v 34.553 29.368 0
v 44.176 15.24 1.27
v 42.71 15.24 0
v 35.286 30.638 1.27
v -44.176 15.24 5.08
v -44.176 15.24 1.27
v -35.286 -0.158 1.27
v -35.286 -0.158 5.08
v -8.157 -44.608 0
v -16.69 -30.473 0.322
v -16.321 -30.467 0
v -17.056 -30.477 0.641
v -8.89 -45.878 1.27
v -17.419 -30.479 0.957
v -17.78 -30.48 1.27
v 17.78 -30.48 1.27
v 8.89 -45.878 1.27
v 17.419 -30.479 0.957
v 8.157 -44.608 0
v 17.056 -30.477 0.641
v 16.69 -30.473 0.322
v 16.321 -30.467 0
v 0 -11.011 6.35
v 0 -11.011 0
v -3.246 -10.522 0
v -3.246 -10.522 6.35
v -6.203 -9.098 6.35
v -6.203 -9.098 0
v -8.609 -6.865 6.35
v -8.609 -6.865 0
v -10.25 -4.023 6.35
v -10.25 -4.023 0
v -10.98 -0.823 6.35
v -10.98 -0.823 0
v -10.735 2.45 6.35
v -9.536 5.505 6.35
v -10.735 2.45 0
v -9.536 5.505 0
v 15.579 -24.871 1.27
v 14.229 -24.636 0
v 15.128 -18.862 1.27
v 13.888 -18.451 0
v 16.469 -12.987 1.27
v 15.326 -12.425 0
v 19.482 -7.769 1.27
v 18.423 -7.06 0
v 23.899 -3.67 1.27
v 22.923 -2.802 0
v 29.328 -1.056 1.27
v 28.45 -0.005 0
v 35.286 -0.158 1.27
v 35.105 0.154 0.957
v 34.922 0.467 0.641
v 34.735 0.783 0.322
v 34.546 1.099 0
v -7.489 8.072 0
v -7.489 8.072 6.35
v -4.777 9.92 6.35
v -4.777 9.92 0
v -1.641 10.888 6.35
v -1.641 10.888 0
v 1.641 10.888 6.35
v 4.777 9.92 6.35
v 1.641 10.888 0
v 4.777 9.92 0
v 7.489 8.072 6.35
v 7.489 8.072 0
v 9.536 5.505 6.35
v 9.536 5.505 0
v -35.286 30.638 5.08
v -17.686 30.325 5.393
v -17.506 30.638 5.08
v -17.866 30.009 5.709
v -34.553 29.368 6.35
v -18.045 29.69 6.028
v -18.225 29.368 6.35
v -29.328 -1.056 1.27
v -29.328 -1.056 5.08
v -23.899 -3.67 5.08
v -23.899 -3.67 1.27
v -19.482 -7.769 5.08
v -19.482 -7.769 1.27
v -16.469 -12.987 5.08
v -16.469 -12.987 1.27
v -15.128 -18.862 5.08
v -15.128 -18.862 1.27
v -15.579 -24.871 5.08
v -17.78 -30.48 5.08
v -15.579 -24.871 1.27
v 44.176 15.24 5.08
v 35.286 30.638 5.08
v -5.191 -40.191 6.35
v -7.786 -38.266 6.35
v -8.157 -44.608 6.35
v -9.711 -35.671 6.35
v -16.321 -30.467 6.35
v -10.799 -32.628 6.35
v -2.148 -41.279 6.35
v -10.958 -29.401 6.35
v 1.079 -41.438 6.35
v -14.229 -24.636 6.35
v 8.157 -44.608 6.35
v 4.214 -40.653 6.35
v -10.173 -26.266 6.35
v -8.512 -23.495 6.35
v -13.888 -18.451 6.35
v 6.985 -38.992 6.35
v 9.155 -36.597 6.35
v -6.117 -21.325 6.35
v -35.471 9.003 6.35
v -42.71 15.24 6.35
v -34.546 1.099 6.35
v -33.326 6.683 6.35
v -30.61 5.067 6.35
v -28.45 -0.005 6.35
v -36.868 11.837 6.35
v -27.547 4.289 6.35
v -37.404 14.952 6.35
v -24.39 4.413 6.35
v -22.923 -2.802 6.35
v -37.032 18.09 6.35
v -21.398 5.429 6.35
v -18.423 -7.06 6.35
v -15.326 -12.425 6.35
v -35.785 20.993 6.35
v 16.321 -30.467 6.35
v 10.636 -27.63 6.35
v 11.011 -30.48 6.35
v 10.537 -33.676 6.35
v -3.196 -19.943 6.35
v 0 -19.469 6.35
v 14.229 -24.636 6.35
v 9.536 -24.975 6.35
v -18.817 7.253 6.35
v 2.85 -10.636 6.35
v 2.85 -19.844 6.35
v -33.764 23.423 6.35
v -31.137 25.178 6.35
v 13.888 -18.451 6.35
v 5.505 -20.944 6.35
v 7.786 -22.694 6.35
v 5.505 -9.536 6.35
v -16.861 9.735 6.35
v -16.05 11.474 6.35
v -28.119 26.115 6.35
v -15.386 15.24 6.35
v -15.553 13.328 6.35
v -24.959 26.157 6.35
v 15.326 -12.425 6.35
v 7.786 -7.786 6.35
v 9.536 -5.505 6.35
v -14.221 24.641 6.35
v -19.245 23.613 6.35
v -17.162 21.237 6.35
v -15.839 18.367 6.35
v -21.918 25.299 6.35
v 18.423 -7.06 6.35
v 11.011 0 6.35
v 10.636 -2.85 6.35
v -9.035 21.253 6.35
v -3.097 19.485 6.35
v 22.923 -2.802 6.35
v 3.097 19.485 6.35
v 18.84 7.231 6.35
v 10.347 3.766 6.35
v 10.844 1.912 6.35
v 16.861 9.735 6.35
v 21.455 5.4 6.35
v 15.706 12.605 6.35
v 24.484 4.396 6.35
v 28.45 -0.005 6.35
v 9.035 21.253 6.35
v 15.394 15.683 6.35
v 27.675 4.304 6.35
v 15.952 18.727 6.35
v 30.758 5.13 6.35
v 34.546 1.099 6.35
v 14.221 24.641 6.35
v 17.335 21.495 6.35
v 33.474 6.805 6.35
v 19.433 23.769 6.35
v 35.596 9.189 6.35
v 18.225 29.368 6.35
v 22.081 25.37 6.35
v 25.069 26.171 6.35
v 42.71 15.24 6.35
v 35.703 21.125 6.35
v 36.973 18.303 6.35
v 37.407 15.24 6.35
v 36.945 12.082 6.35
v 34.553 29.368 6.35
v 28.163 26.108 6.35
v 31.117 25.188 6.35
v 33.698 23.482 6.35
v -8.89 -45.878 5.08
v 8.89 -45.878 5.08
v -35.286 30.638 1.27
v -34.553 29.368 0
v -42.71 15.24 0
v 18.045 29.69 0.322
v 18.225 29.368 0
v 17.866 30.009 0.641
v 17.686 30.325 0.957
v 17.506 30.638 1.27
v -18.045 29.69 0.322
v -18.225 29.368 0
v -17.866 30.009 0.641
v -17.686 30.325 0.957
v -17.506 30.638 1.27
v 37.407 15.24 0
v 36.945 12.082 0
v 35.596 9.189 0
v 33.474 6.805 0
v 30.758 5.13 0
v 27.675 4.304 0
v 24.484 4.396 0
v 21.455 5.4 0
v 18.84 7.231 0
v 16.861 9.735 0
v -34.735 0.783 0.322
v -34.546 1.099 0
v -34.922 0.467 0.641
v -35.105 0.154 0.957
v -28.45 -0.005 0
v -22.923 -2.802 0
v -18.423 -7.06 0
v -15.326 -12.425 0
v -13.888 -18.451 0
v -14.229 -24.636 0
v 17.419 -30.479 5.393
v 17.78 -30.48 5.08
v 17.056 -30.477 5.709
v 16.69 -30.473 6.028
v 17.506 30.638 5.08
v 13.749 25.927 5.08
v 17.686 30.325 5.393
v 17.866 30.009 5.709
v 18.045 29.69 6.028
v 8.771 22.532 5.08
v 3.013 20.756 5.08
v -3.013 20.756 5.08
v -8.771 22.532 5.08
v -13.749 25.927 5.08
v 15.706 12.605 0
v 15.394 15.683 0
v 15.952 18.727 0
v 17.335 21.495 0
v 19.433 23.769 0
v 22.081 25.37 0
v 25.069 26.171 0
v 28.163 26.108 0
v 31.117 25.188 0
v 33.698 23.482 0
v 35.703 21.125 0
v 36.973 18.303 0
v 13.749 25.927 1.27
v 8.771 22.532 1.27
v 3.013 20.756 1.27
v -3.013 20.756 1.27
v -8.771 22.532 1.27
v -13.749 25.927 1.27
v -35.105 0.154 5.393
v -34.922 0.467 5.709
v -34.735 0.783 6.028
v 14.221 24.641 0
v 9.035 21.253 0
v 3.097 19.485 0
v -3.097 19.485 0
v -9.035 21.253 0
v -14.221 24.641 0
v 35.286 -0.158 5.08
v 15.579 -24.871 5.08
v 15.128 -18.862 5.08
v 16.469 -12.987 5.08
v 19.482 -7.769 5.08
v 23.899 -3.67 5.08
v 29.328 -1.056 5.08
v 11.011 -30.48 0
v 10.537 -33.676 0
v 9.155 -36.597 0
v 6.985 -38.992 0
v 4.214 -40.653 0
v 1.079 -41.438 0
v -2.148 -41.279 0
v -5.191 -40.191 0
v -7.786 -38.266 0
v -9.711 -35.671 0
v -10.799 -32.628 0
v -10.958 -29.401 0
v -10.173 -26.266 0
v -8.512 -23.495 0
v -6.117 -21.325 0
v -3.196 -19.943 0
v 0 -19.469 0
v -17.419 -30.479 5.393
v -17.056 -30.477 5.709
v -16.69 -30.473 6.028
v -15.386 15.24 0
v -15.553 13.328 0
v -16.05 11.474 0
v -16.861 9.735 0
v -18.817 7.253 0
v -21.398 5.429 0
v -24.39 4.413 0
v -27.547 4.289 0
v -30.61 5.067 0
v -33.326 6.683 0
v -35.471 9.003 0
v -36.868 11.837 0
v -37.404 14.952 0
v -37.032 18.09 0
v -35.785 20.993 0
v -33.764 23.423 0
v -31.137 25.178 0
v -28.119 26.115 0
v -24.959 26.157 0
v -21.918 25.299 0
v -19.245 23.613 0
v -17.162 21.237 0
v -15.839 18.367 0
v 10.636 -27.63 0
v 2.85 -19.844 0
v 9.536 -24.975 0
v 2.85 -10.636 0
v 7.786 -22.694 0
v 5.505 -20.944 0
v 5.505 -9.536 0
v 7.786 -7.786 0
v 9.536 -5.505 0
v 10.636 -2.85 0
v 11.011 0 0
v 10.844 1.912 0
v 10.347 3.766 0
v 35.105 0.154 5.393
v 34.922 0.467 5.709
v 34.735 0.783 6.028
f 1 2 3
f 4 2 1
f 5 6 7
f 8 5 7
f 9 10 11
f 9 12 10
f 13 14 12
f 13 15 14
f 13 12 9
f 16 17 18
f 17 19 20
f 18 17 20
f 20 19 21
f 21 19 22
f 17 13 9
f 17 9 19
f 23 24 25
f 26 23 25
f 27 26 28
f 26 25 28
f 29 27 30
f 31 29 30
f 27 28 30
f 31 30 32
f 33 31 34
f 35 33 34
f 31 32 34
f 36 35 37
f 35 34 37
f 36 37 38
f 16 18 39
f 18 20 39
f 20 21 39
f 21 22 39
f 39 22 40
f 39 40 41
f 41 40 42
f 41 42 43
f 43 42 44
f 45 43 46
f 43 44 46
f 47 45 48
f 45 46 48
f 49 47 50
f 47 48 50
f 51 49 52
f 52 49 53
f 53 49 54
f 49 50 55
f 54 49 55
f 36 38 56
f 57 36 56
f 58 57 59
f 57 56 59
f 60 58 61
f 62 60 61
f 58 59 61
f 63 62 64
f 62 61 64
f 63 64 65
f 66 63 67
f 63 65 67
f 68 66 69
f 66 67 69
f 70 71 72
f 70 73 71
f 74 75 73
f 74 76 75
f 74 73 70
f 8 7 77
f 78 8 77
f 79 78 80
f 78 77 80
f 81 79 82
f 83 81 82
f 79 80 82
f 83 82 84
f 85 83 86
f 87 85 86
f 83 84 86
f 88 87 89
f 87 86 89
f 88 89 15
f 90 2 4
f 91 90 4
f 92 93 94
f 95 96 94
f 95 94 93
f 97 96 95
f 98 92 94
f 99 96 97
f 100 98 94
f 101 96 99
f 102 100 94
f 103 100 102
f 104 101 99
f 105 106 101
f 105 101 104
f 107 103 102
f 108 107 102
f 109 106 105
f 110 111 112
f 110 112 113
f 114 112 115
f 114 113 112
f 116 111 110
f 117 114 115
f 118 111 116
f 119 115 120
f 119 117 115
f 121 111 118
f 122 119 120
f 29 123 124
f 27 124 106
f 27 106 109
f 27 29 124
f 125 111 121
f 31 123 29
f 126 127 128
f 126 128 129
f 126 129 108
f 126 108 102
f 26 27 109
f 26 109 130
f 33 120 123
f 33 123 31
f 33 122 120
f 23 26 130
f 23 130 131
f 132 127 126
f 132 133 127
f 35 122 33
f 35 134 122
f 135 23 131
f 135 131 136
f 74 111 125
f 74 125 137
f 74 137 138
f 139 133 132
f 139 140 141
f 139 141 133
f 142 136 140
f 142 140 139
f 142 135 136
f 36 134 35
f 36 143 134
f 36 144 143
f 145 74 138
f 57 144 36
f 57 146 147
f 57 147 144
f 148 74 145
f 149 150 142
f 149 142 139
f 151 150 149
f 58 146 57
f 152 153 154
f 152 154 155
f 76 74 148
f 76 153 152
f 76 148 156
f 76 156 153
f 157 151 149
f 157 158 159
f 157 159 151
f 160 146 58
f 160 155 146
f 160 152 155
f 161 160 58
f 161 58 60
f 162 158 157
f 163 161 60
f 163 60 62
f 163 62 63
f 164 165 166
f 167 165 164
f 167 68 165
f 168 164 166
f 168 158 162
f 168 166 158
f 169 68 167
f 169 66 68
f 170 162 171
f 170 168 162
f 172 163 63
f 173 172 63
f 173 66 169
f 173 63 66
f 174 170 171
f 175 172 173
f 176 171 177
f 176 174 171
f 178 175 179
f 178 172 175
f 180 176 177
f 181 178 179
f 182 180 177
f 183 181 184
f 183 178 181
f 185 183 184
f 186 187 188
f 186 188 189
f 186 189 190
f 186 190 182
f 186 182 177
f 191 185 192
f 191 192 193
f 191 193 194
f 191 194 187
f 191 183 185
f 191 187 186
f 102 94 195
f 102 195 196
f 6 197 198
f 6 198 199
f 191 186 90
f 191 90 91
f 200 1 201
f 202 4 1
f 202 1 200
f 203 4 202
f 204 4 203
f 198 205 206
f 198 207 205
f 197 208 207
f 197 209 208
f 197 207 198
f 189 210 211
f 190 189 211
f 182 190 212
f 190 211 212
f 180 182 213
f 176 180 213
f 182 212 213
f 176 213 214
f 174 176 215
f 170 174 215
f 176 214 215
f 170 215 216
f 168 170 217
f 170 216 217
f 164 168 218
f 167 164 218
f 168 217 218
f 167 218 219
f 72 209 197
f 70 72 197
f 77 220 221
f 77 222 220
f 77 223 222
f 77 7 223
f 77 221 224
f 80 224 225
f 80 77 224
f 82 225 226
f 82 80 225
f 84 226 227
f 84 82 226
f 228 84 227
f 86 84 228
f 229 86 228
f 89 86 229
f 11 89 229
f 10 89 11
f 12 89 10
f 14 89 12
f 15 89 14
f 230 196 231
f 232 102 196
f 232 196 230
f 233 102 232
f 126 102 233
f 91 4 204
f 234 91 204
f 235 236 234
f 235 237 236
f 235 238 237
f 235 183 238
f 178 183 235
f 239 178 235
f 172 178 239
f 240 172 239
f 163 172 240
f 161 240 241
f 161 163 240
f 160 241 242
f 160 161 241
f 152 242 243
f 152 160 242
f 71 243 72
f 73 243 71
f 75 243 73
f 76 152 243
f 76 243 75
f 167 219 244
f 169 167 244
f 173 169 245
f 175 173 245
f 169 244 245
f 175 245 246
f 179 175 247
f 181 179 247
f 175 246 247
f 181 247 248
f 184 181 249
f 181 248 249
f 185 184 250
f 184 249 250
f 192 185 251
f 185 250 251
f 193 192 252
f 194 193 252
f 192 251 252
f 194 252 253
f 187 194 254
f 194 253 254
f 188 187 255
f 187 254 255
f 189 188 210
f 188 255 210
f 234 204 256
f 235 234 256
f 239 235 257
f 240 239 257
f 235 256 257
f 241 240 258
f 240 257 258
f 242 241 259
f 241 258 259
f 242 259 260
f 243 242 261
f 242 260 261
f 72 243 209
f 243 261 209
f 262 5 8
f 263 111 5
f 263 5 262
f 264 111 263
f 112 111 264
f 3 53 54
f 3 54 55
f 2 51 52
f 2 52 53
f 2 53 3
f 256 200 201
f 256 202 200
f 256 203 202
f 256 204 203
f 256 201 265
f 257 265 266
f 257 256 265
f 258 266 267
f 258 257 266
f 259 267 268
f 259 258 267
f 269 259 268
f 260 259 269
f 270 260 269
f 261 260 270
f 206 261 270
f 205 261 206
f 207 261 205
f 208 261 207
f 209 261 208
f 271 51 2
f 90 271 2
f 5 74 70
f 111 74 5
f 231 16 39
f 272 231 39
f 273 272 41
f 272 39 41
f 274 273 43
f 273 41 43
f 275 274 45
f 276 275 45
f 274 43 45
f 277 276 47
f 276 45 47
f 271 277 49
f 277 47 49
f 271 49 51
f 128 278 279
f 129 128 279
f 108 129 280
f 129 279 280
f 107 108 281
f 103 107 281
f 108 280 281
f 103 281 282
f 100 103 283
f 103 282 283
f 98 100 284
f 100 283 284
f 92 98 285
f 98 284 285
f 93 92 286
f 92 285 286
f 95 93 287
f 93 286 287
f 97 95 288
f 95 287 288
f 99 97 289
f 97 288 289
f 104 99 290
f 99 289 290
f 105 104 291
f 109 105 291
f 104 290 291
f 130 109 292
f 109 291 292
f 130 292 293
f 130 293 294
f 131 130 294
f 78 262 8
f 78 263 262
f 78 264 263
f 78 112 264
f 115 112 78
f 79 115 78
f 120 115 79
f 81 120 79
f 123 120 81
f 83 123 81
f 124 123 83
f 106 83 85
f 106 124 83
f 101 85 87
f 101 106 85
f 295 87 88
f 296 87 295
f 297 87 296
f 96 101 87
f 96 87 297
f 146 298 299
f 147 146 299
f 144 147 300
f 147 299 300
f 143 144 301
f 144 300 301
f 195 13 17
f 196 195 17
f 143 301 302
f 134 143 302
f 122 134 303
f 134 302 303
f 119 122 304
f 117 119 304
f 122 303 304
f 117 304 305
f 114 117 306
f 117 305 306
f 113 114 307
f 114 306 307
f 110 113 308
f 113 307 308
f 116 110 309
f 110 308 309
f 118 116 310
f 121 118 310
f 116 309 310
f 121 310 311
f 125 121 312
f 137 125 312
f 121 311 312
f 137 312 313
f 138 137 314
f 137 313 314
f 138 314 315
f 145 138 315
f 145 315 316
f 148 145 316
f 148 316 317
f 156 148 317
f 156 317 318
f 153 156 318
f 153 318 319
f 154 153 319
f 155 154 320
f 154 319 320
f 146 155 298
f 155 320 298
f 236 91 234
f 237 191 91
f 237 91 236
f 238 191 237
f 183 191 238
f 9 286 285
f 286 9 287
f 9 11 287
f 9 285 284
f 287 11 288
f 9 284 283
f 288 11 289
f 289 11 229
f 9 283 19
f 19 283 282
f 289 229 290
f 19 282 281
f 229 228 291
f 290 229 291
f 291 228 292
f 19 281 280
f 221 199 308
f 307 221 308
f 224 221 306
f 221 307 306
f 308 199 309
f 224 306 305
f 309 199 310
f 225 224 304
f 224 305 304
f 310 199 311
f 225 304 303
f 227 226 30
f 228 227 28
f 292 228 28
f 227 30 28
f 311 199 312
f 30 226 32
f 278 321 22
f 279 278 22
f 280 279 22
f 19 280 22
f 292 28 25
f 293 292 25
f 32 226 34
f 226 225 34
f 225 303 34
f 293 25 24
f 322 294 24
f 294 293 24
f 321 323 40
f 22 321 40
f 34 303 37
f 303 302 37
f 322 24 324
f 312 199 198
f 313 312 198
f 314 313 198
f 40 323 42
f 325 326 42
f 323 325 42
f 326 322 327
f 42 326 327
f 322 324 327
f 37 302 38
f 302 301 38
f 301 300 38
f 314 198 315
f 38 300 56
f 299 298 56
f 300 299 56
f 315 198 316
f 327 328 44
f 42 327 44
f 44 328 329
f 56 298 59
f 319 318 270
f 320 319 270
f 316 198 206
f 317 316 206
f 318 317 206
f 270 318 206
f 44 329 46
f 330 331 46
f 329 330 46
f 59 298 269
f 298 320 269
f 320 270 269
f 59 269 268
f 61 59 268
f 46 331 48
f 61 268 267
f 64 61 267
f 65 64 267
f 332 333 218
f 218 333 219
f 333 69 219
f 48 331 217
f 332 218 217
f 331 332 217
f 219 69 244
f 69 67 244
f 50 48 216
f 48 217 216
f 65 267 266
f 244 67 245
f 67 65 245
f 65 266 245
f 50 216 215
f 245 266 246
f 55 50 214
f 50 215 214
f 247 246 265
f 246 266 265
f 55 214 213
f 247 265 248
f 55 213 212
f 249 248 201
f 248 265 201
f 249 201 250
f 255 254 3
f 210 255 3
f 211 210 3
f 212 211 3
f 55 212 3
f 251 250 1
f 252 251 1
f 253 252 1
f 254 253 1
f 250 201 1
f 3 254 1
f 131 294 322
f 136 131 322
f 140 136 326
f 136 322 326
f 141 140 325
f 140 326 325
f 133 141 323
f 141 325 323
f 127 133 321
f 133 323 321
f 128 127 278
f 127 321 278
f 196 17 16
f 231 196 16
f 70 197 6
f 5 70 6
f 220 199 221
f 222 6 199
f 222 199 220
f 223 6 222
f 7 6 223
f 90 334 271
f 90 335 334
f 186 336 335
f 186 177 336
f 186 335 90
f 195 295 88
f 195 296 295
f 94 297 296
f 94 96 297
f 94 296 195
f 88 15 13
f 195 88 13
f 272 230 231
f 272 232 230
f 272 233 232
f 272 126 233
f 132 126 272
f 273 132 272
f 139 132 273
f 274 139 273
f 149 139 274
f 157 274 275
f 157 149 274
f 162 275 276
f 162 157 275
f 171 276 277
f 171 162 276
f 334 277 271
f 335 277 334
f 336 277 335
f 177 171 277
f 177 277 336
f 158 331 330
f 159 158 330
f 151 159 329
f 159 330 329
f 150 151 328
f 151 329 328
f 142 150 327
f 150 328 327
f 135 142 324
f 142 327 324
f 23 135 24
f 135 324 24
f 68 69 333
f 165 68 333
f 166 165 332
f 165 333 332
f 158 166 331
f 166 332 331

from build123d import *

# Parameters (mm, degrees)
F1_DEPTH = 6.35
F2_SIZE  = 1.27
F3_SIZE  = 1.27


with BuildPart() as f1:
    # F0 (on Top) → F1 (new body)
    with BuildSketch(Plane.XY):
        with BuildLine():
            ThreePointArc((9.535719, 5.50545), (10.635713, 2.849831), (11.0109, 0))
            ThreePointArc((11.0109, 0), (7.785882, -7.785882), (0, -11.0109))
            Line((0, -11.0109), (0, -15.082068))
            Line((0, -15.082068), (8.89, -15.082068))
            Line((8.89, -15.082068), (17.78, -30.48))
            ThreePointArc((17.78, -30.48), (17.78, -10.265288), (35.286454, -0.157932))
            Line((35.286454, -0.157932), (17.506454, -0.157932))
            Line((17.506454, -0.157932), (13.061454, 7.541034))
            Line((13.061454, 7.541034), (9.535719, 5.50545))
        make_face()
        with BuildLine():
            ThreePointArc((-9.535719, 5.50545), (0, 11.0109), (9.535719, 5.50545))
            Line((9.535719, 5.50545), (13.061454, 7.541034))
            Line((13.061454, 7.541034), (8.616454, 15.24))
            Line((8.616454, 15.24), (17.506454, 30.637932))
            ThreePointArc((17.506454, 30.637932), (0, 20.530576), (-17.506454, 30.637932))
            Line((-17.506454, 30.637932), (-8.616454, 15.24))
            Line((-8.616454, 15.24), (-13.061454, 7.541034))
            Line((-13.061454, 7.541034), (-9.535719, 5.50545))
        make_face()
        with BuildLine():
            Line((0, -15.082068), (0, -11.0109))
            ThreePointArc((0, -11.0109), (-9.535719, -5.50545), (-9.535719, 5.50545))
            Line((-9.535719, 5.50545), (-13.061454, 7.541034))
            Line((-13.061454, 7.541034), (-17.506454, -0.157932))
            Line((-17.506454, -0.157932), (-35.286454, -0.157932))
            ThreePointArc((-35.286454, -0.157932), (-17.78, -10.265288), (-17.78, -30.48))
            Line((-17.78, -30.48), (-8.89, -15.082068))
            Line((-8.89, -15.082068), (0, -15.082068))
        make_face()
        with BuildLine():
            ThreePointArc((37.407354, 15.24), (23.546624, 25.875713), (16.860735, 9.73455))
            ThreePointArc((16.860735, 9.73455), (29.246285, 4.604287), (37.407354, 15.24))
        make_face()
        Polygon((8.616454, 15.24), (13.061454, 7.541034), (17.506454, -0.157932), (35.286454, -0.157932), (44.176454, 15.24), (35.286454, 30.637932), (17.506454, 30.637932), align=None)
        with BuildLine():
            ThreePointArc((37.407354, 15.24), (29.246285, 4.604287), (16.860735, 9.73455))
            ThreePointArc((16.860735, 9.73455), (23.546624, 25.875713), (37.407354, 15.24))
        make_face(mode=Mode.SUBTRACT)
        with BuildLine():
            ThreePointArc((11.0109, -30.48), (7.785882, -22.694118), (0, -19.4691))
            ThreePointArc((0, -19.4691), (-7.785882, -38.265882), (11.0109, -30.48))
        make_face()
        Polygon((8.89, -15.082068), (0, -15.082068), (-8.89, -15.082068), (-17.78, -30.48), (-8.89, -45.877932), (8.89, -45.877932), (17.78, -30.48), align=None)
        with BuildLine():
            ThreePointArc((11.0109, -30.48), (-7.785882, -38.265882), (0, -19.4691))
            ThreePointArc((0, -19.4691), (7.785882, -22.694118), (11.0109, -30.48))
        make_face(mode=Mode.SUBTRACT)
        with BuildLine():
            ThreePointArc((-15.385554, 15.24), (-37.032167, 18.089831), (-16.860735, 9.73455))
            ThreePointArc((-16.860735, 9.73455), (-15.760742, 12.390169), (-15.385554, 15.24))
        make_face()
        Polygon((-17.506454, -0.157932), (-13.061454, 7.541034), (-8.616454, 15.24), (-17.506454, 30.637932), (-35.286454, 30.637932), (-44.176454, 15.24), (-35.286454, -0.157932), align=None)
        with BuildLine():
            ThreePointArc((-15.385554, 15.24), (-15.760742, 12.390169), (-16.860735, 9.73455))
            ThreePointArc((-16.860735, 9.73455), (-37.032167, 18.089831), (-15.385554, 15.24))
        make_face(mode=Mode.SUBTRACT)
    extrude(amount=F1_DEPTH)

    # F2
    f2_edges = [f1.edges().sort_by_distance(p)[0] for p in [
        (-26.396454, 30.637932, 6.35),
        (0, 20.530576, 6.35),
        (26.396454, 30.637932, 6.35),
        (39.731454, 22.938966, 6.35),
        (39.731454, 7.541034, 6.35),
        (17.78, -10.265288, 6.35),
        (13.335, -38.178966, 6.35),
        (0, -45.877932, 6.35),
        (-13.335, -38.178966, 6.35),
        (-17.78, -10.265288, 6.35),
        (-39.731454, 7.541034, 6.35),
        (-39.731454, 22.938966, 6.35),
    ]]
    chamfer(f2_edges, length=F2_SIZE)

    # F3
    f3_edges = [f1.edges().sort_by_distance(p)[0] for p in [
        (0, -45.877932, 0),
        (13.335, -38.178966, 0),
        (17.78, -10.265288, 0),
        (39.731454, 7.541034, 0),
        (39.731454, 22.938966, 0),
        (26.396454, 30.637932, 0),
        (0, 20.530576, 0),
        (-26.396454, 30.637932, 0),
        (-39.731454, 22.938966, 0),
        (-39.731454, 7.541034, 0),
        (-17.78, -10.265288, 0),
        (-13.335, -38.178966, 0),
    ]]
    chamfer(f3_edges, length=F3_SIZE)


solid = f1.part
